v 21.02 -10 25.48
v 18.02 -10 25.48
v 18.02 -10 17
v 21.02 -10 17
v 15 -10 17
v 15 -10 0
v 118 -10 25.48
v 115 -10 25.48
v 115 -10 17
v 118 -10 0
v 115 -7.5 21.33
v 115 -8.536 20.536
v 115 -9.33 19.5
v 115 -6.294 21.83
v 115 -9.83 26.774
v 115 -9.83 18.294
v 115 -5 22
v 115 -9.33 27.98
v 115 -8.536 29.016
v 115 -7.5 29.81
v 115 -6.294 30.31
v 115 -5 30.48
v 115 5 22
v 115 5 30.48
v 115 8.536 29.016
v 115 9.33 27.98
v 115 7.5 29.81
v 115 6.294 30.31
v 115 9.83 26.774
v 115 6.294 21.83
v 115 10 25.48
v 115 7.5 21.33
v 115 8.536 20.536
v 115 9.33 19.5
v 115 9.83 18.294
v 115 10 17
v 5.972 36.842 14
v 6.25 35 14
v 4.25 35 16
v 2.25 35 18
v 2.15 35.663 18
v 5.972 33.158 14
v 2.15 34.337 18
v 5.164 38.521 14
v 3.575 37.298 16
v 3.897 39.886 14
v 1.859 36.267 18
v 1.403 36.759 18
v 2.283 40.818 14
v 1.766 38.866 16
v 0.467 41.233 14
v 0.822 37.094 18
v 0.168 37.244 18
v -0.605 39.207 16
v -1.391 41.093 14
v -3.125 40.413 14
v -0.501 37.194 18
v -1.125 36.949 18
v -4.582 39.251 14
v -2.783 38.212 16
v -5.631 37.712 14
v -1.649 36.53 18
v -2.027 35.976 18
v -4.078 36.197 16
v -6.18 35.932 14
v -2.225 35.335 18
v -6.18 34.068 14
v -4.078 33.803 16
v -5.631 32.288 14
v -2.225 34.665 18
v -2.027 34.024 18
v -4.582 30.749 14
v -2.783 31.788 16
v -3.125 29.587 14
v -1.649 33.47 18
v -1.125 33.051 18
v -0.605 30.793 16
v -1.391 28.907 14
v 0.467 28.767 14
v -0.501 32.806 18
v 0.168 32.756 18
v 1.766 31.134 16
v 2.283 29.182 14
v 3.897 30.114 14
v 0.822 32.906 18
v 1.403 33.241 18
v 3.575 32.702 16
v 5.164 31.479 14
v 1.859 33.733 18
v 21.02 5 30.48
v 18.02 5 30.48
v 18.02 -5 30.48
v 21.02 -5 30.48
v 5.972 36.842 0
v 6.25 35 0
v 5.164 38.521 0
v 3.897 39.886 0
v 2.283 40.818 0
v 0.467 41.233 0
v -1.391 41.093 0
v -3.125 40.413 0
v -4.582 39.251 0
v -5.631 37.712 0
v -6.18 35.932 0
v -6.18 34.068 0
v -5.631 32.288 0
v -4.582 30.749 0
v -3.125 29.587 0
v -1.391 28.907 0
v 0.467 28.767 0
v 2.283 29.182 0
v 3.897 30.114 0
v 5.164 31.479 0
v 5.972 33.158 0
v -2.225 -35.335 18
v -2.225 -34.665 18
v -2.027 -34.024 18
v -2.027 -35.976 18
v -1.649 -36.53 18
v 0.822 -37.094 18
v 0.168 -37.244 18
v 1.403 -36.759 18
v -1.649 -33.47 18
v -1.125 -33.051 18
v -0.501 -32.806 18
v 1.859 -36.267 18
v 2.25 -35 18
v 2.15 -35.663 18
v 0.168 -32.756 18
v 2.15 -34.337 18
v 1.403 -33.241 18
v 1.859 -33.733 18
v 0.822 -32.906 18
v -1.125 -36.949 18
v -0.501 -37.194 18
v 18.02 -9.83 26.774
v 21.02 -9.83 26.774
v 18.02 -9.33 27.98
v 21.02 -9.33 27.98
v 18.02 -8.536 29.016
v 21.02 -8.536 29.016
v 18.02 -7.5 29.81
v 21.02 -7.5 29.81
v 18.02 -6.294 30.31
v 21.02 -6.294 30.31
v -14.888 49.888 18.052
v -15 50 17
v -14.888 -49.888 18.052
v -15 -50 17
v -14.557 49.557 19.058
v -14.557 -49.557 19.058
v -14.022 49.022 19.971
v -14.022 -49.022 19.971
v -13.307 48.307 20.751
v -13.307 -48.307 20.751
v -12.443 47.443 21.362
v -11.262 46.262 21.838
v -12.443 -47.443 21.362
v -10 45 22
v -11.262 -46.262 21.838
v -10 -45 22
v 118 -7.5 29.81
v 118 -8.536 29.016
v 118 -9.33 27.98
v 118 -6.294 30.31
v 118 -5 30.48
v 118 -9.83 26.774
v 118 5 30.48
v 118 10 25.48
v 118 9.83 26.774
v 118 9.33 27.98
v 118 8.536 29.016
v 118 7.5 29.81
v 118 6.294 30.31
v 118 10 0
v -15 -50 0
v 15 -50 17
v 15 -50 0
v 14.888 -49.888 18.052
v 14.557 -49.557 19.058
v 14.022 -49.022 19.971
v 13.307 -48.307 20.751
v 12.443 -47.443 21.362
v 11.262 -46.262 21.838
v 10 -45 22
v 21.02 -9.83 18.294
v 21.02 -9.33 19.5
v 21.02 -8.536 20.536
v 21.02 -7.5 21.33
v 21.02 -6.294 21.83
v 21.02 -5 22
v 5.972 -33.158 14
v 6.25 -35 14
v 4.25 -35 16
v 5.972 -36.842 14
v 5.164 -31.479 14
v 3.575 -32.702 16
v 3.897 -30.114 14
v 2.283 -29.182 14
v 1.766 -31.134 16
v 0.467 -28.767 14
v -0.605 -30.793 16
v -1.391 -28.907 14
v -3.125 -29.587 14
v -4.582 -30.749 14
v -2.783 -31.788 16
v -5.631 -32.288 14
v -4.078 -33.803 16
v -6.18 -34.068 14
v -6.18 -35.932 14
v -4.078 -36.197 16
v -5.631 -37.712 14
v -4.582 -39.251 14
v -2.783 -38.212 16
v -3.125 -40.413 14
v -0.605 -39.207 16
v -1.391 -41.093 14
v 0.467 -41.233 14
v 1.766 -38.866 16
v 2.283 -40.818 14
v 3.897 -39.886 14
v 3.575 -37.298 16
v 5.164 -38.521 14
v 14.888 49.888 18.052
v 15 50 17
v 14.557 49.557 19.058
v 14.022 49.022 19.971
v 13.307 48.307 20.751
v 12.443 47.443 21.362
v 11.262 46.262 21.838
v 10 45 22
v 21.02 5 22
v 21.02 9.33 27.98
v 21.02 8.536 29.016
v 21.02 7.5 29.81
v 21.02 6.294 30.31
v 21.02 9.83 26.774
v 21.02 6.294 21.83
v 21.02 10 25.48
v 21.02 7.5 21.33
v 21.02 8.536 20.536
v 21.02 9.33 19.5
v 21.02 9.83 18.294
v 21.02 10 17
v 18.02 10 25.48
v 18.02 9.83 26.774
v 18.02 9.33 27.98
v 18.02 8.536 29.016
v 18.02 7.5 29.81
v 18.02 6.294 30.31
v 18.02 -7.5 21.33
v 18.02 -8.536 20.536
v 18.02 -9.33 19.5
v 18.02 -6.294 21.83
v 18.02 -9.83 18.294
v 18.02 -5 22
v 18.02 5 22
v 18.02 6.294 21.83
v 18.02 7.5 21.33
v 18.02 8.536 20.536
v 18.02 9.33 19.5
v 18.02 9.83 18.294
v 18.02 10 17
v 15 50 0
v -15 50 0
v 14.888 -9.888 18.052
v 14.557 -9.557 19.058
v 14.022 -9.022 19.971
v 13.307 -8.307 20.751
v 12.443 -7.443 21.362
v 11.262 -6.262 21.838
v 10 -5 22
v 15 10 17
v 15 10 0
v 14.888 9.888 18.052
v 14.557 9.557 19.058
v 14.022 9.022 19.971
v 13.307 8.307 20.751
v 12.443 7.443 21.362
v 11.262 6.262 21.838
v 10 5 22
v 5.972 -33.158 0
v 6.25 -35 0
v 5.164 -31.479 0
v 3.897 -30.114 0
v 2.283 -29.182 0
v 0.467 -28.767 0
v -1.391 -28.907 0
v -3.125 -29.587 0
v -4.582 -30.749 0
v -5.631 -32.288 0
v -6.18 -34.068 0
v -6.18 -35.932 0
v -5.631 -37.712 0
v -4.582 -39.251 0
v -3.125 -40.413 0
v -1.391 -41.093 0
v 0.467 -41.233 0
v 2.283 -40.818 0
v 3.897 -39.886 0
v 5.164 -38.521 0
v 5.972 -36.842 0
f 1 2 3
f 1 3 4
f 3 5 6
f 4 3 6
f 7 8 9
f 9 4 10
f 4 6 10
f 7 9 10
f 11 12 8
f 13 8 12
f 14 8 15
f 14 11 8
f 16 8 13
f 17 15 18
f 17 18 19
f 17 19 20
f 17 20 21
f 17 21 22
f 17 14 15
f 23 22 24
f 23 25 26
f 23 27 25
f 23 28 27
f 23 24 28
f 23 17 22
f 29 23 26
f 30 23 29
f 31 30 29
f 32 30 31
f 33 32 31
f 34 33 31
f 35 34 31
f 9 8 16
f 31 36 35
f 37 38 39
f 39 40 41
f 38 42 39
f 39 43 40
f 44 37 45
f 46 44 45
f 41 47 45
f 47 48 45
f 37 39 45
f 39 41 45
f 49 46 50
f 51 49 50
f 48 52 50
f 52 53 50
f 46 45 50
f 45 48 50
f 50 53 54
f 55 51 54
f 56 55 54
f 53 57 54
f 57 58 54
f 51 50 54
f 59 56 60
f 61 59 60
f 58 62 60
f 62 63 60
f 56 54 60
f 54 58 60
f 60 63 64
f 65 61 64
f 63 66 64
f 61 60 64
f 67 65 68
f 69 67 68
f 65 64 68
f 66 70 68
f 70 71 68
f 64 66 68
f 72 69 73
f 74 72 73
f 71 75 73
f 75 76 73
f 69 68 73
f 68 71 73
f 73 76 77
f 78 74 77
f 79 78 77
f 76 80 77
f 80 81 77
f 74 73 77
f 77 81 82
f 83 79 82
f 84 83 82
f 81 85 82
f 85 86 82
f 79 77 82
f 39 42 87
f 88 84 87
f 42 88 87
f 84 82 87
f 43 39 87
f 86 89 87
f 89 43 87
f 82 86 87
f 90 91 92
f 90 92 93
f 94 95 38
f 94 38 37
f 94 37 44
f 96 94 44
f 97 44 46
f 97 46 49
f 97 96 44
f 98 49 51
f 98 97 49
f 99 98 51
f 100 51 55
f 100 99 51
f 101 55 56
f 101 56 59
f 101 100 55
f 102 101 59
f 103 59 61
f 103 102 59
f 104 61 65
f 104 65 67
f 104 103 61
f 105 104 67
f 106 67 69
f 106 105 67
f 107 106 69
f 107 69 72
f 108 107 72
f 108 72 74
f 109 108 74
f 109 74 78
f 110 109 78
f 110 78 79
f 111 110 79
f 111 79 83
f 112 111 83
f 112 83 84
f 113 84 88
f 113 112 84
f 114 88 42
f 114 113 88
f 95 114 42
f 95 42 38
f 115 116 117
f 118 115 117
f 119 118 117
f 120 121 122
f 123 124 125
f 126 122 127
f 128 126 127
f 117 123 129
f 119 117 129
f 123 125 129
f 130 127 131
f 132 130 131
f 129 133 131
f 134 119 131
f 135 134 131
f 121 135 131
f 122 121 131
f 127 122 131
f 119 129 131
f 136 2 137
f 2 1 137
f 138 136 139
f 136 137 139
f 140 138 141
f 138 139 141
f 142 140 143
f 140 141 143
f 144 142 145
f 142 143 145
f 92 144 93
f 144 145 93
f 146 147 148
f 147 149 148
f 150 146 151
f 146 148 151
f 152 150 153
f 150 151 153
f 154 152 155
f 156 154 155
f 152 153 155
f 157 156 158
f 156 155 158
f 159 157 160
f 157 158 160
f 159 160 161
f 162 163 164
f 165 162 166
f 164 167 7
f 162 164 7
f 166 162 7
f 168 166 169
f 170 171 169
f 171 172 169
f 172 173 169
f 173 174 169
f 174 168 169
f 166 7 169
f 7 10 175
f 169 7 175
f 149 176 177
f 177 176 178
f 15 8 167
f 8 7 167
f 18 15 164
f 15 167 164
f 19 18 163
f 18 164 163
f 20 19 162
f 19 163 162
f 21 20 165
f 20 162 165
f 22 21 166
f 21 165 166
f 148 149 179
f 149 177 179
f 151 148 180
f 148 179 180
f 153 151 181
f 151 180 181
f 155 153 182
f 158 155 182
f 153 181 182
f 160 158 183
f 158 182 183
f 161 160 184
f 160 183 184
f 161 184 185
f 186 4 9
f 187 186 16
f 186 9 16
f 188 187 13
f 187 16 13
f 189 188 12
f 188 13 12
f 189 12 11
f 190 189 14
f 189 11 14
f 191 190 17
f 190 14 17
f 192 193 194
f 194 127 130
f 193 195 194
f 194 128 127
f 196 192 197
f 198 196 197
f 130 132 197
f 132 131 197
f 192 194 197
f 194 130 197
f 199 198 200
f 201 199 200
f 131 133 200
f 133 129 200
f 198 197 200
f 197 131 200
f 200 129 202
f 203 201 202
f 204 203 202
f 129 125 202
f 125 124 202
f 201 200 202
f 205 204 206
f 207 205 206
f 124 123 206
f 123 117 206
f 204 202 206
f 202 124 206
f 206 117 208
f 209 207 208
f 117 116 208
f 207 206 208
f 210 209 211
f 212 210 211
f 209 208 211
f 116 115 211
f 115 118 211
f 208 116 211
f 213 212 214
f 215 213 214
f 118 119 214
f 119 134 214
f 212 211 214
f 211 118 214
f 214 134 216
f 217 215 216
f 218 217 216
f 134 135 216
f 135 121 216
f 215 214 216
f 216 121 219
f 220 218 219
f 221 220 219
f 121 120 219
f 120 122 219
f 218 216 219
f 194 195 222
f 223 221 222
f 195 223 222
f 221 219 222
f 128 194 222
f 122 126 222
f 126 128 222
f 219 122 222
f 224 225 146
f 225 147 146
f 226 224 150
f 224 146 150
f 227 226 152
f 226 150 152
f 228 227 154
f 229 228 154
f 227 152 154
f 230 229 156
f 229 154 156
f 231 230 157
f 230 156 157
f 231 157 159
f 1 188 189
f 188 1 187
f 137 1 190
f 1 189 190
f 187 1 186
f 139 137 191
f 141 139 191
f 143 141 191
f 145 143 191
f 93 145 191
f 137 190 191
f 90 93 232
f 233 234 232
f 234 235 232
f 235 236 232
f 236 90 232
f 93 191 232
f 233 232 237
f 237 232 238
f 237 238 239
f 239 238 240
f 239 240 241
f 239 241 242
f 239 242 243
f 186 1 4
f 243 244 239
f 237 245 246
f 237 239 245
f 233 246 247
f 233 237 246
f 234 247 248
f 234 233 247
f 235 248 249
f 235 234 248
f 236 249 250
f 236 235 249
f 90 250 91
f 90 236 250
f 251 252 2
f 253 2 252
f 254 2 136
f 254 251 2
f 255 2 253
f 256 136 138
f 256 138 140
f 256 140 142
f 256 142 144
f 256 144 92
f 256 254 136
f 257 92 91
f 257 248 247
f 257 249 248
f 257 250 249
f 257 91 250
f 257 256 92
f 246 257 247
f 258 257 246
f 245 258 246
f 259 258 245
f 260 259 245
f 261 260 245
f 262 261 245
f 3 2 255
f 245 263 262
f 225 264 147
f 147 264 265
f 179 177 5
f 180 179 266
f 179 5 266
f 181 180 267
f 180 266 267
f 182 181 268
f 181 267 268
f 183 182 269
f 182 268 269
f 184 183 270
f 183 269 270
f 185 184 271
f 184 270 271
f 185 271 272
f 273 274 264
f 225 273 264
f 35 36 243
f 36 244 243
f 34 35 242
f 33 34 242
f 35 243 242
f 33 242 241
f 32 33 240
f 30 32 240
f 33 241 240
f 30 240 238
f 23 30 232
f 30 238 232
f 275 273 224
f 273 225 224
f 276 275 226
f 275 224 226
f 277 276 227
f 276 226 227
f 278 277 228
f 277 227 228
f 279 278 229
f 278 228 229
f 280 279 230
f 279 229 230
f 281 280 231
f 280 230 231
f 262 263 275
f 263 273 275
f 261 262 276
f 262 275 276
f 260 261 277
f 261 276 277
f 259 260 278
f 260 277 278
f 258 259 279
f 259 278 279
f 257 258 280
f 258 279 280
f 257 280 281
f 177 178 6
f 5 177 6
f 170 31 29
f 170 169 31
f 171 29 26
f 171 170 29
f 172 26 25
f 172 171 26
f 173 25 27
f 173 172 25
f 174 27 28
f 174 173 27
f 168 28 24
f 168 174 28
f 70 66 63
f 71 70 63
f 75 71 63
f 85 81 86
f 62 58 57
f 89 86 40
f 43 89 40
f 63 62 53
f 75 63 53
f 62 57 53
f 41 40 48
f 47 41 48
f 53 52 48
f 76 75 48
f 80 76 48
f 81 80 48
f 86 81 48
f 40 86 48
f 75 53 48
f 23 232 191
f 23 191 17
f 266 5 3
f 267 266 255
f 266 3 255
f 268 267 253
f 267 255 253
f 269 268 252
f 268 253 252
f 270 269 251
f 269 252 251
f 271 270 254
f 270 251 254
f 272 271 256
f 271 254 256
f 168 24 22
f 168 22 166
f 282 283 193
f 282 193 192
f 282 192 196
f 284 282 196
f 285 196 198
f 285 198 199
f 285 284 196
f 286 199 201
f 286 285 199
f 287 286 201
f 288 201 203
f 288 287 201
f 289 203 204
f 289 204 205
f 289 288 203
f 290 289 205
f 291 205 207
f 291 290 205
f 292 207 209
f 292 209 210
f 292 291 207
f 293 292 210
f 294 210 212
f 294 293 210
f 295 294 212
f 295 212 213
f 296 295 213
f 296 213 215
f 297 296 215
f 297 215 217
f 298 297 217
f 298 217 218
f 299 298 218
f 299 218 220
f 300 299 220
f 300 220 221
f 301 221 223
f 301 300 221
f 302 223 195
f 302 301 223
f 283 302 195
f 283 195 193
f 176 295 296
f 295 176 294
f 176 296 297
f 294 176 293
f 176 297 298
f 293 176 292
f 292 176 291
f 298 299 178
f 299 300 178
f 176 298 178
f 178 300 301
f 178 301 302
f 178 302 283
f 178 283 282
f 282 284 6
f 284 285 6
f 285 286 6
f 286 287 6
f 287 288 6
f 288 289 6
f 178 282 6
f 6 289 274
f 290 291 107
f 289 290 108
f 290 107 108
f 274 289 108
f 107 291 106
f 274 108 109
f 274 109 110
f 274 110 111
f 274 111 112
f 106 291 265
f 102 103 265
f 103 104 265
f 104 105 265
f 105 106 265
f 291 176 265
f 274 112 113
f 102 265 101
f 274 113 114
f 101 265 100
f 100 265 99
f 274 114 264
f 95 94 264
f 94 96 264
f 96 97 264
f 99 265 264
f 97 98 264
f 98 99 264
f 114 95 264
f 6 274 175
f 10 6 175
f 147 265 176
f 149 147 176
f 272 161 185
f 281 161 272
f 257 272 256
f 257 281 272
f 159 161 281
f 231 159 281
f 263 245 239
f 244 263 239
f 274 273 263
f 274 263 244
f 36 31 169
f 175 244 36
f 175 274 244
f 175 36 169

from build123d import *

# Parameters (mm, degrees)
F0_R     = 6.25
F0_W     = 15
F0_H     = 20
F0_W_2   = 93.98
F0_W_3   = 3.02
F0_W_4   = 3
F1_DEPTH = 22
F2_DEPTH = 30.48
F3_DEPTH = 18
F4_SIZE  = 4
F5_R     = 5


with BuildPart() as f1:
    # F0 (on Top) → F1 (new body)
    with BuildSketch(Plane.XY):
        Polygon((15, 10), (15, 50), (-15, 50), (-15, -50), (15, -50), (15, -10), (0, -10), (0, 10), align=None)
        with Locations((0, -35)):
            Circle(F0_R, mode=Mode.SUBTRACT)
        with Locations((0, 35)):
            Circle(F0_R, mode=Mode.SUBTRACT)
        with Locations((7.5, 0)):
            Rectangle(F0_W, F0_H)
        with Locations((68.01, 0)):
            Rectangle(F0_W_2, F0_H)
        with Locations((0, -35)):
            Circle(F0_R)
        with Locations((0, 35)):
            Circle(F0_R)
        with Locations((16.51, 0)):
            Rectangle(F0_W_3, F0_H)
        with Locations((19.52, 0)):
            Rectangle(F0_W_4, F0_H)
    extrude(amount=F1_DEPTH)

    # F0 (on Top) → F2 (join)
    with BuildSketch(Plane.XY):
        with Locations((116.5, 0)):
            Rectangle(F0_W_4, F0_H)
        with Locations((19.52, 0)):
            Rectangle(F0_W_4, F0_H)
    extrude(amount=F2_DEPTH)

    # F0 (on Top) → F3 (cut)
    with BuildSketch(Plane.XY):
        with Locations((0, -35)):
            Circle(F0_R)
        with Locations((0, 35)):
            Circle(F0_R)
    extrude(amount=F3_DEPTH, mode=Mode.SUBTRACT)

    # F4
    f4_edges = [f1.edges().sort_by_distance(p)[0] for p in [
        (-6.25, -35, 18),
        (-6.25, 35, 18),
    ]]
    chamfer(f4_edges, length=F4_SIZE)

    # F5
    f5_edges = [f1.edges().sort_by_distance(p)[0] for p in [
        (68.01, -10, 22),
        (68.01, 10, 22),
        (116.5, -10, 30.48),
        (116.5, 10, 30.48),
        (15, -30, 22),
        (15, 30, 22),
        (-15, 0, 22),
        (0, -50, 22),
        (0, 50, 22),
        (19.52, -10, 30.48),
        (19.52, 10, 30.48),
        (16.51, 10, 22),
        (16.51, -10, 22),
    ]]
    fillet(f5_edges, radius=F5_R)


solid = f1.part
